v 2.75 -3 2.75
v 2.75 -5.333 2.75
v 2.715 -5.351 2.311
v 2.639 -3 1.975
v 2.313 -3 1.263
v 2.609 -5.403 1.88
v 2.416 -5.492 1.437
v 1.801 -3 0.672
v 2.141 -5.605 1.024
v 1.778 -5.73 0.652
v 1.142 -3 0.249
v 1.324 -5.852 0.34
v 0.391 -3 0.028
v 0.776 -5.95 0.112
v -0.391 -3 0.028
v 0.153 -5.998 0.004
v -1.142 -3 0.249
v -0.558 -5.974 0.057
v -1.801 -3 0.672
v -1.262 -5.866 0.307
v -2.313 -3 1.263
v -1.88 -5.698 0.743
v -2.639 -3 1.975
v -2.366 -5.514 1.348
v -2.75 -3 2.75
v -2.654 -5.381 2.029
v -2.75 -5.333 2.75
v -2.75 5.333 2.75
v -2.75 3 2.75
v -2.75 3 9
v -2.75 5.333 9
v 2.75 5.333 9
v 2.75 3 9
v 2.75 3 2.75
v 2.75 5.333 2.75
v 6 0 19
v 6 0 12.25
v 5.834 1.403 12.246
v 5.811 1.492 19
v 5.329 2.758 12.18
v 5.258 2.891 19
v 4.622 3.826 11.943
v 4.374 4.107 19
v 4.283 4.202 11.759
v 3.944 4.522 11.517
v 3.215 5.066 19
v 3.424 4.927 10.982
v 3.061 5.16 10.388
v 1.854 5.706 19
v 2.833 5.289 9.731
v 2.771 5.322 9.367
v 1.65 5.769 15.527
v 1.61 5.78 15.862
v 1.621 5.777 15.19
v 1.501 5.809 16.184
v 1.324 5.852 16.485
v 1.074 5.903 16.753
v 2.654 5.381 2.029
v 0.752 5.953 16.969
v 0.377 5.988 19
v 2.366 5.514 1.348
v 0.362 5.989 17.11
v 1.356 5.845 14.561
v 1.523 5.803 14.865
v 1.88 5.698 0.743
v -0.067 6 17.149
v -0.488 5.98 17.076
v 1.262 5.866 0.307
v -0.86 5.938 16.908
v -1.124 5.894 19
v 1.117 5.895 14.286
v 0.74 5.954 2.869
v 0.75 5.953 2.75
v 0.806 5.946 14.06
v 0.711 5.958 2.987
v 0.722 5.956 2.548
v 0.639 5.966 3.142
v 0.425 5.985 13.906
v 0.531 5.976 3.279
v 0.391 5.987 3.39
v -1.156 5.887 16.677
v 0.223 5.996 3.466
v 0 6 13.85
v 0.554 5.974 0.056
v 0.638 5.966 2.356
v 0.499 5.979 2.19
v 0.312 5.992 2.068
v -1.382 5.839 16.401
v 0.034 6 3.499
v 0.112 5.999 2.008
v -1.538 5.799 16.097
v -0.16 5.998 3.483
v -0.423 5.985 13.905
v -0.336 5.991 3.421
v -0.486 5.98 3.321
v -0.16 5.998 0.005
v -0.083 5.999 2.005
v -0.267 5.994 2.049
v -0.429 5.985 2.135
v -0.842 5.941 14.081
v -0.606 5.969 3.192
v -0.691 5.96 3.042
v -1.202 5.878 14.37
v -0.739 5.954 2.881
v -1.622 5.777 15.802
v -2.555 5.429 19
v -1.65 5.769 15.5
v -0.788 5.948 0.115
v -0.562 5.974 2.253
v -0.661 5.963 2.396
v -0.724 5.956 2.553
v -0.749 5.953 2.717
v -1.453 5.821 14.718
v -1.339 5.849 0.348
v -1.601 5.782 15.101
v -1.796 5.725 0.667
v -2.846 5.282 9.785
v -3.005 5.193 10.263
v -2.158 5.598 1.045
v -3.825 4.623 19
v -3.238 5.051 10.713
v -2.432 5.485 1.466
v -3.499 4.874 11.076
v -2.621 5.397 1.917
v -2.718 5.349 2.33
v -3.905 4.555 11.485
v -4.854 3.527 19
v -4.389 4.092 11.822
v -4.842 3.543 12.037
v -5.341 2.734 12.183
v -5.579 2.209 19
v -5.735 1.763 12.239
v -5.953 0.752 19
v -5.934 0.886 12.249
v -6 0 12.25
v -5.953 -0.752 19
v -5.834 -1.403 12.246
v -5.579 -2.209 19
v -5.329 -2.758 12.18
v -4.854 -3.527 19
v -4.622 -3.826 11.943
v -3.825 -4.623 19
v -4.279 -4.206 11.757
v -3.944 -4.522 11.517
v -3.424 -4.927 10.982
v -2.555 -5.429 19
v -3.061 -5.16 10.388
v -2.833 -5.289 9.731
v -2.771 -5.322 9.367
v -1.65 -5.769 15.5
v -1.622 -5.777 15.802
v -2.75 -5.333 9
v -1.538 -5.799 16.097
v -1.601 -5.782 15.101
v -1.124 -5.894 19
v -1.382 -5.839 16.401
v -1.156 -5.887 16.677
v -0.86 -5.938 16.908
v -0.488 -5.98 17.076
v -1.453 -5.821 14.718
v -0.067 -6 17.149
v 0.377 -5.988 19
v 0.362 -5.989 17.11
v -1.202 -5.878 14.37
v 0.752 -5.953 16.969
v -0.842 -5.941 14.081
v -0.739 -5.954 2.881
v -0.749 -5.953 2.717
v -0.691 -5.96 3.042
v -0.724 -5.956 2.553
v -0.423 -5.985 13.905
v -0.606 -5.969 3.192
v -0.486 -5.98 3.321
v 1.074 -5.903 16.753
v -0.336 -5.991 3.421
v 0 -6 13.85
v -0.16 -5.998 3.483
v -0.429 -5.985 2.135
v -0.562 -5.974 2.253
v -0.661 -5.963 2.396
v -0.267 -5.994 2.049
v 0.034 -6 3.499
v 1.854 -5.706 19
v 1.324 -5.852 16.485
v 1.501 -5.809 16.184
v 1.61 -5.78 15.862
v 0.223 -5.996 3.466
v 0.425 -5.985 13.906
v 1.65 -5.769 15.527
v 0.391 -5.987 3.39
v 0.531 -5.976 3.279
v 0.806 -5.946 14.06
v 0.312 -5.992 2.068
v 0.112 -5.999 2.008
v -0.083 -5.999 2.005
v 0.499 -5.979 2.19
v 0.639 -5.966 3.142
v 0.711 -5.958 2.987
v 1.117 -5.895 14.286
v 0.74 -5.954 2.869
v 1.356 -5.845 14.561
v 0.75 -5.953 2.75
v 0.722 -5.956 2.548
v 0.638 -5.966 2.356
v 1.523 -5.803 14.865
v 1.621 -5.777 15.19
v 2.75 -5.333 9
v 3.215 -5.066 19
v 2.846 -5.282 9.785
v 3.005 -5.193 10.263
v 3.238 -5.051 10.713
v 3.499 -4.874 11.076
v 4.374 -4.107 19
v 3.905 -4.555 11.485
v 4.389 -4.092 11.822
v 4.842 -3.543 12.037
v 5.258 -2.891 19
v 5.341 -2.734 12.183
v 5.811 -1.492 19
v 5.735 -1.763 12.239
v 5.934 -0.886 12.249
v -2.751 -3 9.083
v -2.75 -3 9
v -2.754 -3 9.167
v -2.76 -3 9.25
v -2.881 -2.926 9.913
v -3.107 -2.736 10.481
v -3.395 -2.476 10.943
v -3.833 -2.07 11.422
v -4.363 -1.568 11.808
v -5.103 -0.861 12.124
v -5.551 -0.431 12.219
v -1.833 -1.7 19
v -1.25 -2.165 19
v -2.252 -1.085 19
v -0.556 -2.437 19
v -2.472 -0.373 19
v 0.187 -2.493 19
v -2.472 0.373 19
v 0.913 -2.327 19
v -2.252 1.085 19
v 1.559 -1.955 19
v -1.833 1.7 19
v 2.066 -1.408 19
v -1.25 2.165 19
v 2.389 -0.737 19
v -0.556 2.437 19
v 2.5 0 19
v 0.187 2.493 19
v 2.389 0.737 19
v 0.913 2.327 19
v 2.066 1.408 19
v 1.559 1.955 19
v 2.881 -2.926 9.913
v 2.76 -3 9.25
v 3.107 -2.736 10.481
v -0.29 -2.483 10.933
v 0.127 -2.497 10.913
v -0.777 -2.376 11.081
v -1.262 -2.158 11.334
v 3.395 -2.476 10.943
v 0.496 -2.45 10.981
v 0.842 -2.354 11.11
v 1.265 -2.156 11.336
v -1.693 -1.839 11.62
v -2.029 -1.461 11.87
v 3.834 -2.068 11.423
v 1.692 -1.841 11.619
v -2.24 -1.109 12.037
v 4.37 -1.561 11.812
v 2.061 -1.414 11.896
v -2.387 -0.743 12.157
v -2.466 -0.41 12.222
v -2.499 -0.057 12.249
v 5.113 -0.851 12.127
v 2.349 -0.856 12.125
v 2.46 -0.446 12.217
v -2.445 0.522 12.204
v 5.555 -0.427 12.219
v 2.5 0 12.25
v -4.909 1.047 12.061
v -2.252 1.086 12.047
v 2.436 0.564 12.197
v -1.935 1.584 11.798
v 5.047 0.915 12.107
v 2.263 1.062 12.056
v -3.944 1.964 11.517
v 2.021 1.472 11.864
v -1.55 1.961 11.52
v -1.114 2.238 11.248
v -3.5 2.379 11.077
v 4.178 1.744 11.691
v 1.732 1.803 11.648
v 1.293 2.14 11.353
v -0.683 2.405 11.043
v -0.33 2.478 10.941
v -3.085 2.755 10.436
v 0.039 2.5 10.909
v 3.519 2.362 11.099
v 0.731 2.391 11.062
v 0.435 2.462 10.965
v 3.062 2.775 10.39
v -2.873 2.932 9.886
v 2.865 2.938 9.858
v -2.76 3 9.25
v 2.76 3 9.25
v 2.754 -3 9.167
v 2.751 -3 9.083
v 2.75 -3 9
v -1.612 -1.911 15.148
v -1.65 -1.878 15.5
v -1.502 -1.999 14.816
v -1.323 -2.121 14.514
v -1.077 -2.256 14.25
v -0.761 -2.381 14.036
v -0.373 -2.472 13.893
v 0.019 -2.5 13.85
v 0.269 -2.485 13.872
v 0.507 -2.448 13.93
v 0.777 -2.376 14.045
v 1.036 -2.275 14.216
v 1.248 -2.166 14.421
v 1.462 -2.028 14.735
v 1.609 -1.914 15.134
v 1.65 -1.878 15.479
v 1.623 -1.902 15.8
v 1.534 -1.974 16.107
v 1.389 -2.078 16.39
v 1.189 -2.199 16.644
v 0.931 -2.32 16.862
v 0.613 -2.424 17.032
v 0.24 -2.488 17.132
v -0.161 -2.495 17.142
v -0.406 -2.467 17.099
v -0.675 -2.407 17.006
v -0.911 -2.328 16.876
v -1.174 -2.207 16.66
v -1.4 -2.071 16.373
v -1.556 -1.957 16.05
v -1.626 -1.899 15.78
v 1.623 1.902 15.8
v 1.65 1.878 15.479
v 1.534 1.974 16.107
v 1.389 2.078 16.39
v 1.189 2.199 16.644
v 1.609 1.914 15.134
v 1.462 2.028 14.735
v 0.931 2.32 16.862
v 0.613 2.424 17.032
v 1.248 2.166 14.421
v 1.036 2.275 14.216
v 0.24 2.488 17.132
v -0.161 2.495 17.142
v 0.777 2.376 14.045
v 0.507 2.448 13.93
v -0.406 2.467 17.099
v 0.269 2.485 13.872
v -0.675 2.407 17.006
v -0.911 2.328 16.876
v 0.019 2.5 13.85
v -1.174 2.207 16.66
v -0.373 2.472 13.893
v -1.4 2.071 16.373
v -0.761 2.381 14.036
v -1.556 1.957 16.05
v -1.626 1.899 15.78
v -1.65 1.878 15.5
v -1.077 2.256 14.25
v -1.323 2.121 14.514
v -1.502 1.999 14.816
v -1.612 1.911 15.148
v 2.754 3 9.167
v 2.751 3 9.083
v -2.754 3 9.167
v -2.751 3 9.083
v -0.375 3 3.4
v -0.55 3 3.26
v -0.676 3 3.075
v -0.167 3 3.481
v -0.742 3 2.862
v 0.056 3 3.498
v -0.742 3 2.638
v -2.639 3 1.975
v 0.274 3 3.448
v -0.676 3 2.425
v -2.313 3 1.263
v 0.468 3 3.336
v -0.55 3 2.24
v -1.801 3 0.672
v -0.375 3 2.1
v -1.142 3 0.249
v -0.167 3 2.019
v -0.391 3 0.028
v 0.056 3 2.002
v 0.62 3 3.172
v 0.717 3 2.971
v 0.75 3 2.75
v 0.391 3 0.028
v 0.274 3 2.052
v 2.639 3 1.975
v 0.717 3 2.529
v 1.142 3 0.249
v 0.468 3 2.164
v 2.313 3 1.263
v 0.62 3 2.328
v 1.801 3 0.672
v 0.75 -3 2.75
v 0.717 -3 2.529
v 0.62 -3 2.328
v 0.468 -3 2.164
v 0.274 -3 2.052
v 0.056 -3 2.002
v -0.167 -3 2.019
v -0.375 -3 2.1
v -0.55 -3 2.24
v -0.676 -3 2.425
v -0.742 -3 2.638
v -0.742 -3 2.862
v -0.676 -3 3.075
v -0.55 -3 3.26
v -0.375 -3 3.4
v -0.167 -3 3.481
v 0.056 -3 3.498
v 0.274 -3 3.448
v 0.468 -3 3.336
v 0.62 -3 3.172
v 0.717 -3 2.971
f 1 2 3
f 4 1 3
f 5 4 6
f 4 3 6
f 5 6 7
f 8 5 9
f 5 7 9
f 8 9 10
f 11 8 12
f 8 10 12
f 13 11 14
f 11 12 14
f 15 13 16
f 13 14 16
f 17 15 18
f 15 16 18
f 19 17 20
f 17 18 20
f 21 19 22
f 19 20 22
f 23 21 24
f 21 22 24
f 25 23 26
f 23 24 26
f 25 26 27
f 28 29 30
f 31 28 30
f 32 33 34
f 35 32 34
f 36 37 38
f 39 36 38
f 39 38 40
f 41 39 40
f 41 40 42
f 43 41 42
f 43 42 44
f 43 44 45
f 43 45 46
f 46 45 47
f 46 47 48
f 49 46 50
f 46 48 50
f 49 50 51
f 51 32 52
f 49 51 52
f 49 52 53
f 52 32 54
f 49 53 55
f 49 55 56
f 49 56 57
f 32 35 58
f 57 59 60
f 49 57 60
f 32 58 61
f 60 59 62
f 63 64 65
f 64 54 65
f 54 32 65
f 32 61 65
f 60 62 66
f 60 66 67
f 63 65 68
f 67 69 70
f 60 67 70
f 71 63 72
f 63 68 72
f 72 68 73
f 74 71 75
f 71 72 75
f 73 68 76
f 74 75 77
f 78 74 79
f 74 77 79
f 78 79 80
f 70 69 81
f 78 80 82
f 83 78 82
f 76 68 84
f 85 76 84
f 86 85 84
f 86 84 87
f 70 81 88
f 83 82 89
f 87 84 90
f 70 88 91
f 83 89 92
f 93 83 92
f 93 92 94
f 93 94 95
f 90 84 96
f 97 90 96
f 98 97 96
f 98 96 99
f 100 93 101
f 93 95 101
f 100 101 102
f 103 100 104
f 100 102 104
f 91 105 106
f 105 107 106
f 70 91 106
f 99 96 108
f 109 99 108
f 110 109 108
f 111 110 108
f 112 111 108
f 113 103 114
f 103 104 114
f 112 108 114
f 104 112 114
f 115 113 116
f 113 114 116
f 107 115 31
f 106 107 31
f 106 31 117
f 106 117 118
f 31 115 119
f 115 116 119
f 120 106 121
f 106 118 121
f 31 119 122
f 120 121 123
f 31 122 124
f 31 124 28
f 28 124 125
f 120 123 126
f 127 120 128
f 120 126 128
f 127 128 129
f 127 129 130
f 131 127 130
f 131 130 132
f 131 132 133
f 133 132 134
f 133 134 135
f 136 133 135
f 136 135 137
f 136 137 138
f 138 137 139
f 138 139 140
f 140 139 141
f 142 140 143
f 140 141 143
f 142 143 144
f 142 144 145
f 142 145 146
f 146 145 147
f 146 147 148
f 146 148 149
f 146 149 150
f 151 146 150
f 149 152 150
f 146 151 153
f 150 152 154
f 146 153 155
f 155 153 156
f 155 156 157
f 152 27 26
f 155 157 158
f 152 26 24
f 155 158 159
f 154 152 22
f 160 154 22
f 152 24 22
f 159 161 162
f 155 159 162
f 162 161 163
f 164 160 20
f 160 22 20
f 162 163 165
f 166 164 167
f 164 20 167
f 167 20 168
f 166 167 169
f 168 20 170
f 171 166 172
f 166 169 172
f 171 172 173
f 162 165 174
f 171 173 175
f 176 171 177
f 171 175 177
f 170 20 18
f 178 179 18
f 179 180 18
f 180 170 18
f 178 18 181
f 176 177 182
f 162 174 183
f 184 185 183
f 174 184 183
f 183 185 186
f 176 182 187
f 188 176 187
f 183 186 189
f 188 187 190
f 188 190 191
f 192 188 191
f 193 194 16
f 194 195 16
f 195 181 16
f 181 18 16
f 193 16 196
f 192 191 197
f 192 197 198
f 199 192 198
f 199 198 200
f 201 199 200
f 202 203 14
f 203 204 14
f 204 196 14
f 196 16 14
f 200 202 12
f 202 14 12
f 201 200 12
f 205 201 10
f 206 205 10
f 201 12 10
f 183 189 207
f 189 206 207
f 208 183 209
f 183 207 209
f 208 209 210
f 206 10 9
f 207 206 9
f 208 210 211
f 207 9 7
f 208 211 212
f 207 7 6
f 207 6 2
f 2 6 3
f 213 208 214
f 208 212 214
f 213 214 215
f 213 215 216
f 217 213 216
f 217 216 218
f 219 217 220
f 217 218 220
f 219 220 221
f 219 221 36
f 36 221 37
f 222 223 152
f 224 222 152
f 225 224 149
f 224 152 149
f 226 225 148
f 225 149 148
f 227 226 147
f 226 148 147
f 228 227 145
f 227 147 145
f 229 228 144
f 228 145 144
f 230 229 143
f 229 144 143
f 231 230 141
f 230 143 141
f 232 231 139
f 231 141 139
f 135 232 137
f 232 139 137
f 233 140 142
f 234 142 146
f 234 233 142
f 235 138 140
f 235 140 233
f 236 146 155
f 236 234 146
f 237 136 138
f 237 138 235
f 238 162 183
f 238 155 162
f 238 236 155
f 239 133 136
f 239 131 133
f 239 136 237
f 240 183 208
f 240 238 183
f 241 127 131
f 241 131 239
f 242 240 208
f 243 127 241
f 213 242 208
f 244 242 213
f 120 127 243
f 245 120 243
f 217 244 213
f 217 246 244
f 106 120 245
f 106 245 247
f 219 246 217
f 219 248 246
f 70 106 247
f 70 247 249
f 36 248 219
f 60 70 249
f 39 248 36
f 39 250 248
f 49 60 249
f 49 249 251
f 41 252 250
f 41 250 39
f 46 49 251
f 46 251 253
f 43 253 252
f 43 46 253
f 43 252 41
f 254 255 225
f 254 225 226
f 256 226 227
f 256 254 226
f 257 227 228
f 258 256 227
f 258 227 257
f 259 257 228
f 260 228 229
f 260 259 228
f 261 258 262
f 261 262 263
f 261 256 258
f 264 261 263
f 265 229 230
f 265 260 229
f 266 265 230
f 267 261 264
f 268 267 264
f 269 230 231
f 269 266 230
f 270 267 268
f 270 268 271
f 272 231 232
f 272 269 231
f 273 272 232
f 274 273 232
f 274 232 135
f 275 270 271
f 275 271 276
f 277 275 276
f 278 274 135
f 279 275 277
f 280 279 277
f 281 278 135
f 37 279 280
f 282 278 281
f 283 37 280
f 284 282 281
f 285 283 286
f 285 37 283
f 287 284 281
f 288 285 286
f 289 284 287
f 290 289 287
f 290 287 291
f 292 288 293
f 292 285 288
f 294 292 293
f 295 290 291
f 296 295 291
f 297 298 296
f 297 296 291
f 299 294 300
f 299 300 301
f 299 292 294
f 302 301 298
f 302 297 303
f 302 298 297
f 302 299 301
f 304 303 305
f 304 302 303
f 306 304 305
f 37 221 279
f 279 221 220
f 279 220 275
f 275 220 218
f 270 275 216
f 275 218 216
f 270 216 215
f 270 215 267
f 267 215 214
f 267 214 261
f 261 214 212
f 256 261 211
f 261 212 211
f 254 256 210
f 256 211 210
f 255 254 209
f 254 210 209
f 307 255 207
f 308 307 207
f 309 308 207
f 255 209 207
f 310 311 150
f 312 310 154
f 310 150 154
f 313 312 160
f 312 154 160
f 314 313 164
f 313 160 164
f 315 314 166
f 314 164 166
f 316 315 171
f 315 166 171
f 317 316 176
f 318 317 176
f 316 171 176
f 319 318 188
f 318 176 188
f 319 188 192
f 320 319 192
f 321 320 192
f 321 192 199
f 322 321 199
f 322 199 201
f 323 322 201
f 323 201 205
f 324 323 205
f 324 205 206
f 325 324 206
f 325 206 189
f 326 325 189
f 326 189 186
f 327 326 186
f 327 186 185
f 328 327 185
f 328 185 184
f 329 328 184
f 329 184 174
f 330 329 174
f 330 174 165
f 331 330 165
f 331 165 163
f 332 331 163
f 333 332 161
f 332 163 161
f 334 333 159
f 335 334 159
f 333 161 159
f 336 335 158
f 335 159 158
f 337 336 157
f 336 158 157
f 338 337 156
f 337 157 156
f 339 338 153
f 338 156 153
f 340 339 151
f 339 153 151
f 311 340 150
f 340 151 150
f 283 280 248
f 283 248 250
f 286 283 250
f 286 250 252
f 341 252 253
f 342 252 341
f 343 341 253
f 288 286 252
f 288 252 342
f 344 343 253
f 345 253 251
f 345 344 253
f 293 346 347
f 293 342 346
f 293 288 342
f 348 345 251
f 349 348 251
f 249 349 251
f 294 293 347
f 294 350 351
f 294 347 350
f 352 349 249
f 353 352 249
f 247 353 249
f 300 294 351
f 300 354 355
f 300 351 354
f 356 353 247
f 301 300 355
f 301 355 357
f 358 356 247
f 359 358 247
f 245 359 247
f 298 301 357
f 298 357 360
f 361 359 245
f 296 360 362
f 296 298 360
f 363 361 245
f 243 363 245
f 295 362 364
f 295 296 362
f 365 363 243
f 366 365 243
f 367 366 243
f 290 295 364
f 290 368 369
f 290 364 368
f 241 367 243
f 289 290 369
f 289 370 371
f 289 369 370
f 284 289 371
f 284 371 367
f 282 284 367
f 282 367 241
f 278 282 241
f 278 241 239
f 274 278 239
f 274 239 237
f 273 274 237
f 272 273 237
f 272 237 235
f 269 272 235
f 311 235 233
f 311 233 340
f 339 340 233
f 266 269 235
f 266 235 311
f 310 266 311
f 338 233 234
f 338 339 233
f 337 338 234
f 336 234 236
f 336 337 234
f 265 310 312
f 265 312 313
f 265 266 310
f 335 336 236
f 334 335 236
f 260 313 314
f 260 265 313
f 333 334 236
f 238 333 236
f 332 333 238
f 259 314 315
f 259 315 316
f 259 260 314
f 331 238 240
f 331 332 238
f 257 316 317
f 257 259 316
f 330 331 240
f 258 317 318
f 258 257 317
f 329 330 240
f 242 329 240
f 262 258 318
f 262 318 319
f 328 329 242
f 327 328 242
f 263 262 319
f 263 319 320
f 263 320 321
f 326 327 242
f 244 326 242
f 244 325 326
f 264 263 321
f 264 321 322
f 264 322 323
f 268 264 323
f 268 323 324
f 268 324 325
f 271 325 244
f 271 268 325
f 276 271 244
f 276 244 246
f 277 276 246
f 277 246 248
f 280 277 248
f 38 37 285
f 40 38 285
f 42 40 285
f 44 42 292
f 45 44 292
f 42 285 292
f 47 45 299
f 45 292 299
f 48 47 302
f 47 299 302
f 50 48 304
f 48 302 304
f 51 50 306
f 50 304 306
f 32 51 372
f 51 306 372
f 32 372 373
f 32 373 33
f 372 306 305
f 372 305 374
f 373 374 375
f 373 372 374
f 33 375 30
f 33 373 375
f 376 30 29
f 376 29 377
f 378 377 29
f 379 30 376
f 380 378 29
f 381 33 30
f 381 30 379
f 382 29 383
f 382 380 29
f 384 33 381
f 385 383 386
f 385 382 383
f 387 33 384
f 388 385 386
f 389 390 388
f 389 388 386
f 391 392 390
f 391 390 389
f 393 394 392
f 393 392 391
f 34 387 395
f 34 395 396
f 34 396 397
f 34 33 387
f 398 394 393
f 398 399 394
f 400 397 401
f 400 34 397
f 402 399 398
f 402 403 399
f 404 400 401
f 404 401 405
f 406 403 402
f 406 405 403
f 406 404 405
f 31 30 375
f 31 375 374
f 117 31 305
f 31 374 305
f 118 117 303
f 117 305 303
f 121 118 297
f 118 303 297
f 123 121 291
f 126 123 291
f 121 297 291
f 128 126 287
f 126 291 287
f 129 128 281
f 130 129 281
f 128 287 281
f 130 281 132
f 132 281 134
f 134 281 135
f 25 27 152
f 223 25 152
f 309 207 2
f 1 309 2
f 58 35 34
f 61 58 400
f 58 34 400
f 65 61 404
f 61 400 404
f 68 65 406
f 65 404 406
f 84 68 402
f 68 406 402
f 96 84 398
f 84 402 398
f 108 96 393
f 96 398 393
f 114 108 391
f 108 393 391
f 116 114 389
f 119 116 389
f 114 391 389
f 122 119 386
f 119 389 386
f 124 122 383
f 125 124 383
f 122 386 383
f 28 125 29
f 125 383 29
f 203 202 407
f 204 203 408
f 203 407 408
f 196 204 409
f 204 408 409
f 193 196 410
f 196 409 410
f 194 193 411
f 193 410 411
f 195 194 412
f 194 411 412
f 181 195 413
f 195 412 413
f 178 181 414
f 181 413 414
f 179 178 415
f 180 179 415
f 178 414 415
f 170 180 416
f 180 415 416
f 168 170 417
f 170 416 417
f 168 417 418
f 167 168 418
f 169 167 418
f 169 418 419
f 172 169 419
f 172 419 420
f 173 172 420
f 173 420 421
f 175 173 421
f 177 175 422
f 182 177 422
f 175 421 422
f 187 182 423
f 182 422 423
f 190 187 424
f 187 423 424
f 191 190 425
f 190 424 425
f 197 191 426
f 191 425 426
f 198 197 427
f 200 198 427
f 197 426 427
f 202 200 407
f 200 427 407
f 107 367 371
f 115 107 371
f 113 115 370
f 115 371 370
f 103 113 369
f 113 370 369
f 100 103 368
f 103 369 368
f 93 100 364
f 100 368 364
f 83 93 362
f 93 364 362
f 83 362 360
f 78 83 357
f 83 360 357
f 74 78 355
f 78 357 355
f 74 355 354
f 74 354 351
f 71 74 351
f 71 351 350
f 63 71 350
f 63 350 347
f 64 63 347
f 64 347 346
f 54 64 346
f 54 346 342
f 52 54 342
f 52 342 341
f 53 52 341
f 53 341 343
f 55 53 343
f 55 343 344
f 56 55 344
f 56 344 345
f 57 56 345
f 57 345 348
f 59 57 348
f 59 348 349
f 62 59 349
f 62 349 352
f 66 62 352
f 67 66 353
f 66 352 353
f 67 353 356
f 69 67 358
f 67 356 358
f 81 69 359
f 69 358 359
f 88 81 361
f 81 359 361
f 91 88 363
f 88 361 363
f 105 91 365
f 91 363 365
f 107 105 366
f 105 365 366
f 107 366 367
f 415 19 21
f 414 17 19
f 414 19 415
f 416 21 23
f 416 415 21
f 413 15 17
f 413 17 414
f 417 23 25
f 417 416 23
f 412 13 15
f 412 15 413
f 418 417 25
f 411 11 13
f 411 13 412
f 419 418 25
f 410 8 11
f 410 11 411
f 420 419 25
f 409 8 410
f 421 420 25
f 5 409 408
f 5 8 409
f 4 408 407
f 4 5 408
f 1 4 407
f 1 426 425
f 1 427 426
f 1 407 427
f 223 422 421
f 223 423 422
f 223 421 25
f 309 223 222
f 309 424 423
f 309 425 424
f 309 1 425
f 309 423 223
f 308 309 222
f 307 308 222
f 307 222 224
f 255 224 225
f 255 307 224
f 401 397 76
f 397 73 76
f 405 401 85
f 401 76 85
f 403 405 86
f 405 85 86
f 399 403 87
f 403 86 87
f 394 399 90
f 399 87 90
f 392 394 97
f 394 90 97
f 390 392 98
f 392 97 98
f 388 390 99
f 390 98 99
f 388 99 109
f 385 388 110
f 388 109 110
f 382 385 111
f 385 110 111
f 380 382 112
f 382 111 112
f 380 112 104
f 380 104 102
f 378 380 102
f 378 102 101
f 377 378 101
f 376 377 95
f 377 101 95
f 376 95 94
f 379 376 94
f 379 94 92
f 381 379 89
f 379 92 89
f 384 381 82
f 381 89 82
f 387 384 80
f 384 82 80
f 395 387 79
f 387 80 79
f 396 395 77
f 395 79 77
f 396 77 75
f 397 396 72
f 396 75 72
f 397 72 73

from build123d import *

# Parameters (mm, degrees)
SKETCH_1_R             = 6
SKETCH_1_R_2           = 2.5
EXTRUDE_1_DEPTH        = 19
SKETCH_2_OUTSIDE_W     = 19.096
SKETCH_2_OUTSIDE_H     = 26.096
SKETCH_2_OUTSIDE_R     = 0.75
CUT_EXTRUDE_1_DEPTH    = 9.5
CUT_EXTRUDE_2_DEPTH    = 9.5
HOLE_WIZARD_M4_1_D     = 3.3
HOLE_WIZARD_M4_1_DEPTH = 20
HOLE_WIZARD_M4_1_TIP   = 0.991420021


with BuildPart() as part:
    # 草图1 → 凸台-拉伸1 (new body)
    with BuildSketch(Plane.XY):
        Circle(SKETCH_1_R)
        Circle(SKETCH_1_R_2, mode=Mode.SUBTRACT)
    extrude(amount=EXTRUDE_1_DEPTH)

    # 草图2 outside → 切除-拉伸1 (cut, symmetric)
    with BuildSketch(Plane(origin=(0, 0, 0), x_dir=(1, 0, 0), z_dir=(0, 1, 0))):
        with Locations((0, -9.5)):
            Rectangle(SKETCH_2_OUTSIDE_W, SKETCH_2_OUTSIDE_H)
        with BuildLine():
            Line((-2.75, -2.75), (-2.75, -9))
            ThreePointArc((-2.75, -9), (-3.701902961, -11.298097039), (-6, -12.25))
            Line((-6, -12.25), (-6, -19))
            Line((-6, -19), (6, -19))
            Line((6, -19), (6, -12.25))
            ThreePointArc((6, -12.25), (3.701902961, -11.298097039), (2.75, -9))
            Line((2.75, -9), (2.75, -2.75))
            ThreePointArc((2.75, -2.75), (0, 0), (-2.75, -2.75))
        make_face(mode=Mode.SUBTRACT)
        with Locations((0, -2.75)):
            Circle(SKETCH_2_OUTSIDE_R)
    extrude(amount=CUT_EXTRUDE_1_DEPTH, both=True, mode=Mode.SUBTRACT)

    # 草图3 → 切除-拉伸2 (cut, symmetric)
    with BuildSketch(Plane(origin=(0, 0, 0), x_dir=(0, 0, -1), z_dir=(1, 0, 0))):
        with BuildLine():
            Line((-9.250000001, 3), (0, 3))
            Line((0, 3), (0, -3))
            Line((0, -3), (-9.250000001, -3))
            ThreePointArc((-9.250000001, -3), (-12.250000001, 0), (-9.250000001, 3))
        make_face()
    extrude(amount=CUT_EXTRUDE_2_DEPTH, both=True, mode=Mode.SUBTRACT)

    # M4 螺纹孔1
    with Locations(Plane(origin=(0, 6, 0), x_dir=(1, 0, 0), z_dir=(0, 1, 0))):
        with Locations((0, -15.5)):
            Hole(HOLE_WIZARD_M4_1_D / 2, depth=HOLE_WIZARD_M4_1_DEPTH)
            with Locations((0, 0, -(HOLE_WIZARD_M4_1_DEPTH + HOLE_WIZARD_M4_1_TIP / 2))):  # 118° drill point
                Cone(0, HOLE_WIZARD_M4_1_D / 2, HOLE_WIZARD_M4_1_TIP, mode=Mode.SUBTRACT)


solid = part.part
